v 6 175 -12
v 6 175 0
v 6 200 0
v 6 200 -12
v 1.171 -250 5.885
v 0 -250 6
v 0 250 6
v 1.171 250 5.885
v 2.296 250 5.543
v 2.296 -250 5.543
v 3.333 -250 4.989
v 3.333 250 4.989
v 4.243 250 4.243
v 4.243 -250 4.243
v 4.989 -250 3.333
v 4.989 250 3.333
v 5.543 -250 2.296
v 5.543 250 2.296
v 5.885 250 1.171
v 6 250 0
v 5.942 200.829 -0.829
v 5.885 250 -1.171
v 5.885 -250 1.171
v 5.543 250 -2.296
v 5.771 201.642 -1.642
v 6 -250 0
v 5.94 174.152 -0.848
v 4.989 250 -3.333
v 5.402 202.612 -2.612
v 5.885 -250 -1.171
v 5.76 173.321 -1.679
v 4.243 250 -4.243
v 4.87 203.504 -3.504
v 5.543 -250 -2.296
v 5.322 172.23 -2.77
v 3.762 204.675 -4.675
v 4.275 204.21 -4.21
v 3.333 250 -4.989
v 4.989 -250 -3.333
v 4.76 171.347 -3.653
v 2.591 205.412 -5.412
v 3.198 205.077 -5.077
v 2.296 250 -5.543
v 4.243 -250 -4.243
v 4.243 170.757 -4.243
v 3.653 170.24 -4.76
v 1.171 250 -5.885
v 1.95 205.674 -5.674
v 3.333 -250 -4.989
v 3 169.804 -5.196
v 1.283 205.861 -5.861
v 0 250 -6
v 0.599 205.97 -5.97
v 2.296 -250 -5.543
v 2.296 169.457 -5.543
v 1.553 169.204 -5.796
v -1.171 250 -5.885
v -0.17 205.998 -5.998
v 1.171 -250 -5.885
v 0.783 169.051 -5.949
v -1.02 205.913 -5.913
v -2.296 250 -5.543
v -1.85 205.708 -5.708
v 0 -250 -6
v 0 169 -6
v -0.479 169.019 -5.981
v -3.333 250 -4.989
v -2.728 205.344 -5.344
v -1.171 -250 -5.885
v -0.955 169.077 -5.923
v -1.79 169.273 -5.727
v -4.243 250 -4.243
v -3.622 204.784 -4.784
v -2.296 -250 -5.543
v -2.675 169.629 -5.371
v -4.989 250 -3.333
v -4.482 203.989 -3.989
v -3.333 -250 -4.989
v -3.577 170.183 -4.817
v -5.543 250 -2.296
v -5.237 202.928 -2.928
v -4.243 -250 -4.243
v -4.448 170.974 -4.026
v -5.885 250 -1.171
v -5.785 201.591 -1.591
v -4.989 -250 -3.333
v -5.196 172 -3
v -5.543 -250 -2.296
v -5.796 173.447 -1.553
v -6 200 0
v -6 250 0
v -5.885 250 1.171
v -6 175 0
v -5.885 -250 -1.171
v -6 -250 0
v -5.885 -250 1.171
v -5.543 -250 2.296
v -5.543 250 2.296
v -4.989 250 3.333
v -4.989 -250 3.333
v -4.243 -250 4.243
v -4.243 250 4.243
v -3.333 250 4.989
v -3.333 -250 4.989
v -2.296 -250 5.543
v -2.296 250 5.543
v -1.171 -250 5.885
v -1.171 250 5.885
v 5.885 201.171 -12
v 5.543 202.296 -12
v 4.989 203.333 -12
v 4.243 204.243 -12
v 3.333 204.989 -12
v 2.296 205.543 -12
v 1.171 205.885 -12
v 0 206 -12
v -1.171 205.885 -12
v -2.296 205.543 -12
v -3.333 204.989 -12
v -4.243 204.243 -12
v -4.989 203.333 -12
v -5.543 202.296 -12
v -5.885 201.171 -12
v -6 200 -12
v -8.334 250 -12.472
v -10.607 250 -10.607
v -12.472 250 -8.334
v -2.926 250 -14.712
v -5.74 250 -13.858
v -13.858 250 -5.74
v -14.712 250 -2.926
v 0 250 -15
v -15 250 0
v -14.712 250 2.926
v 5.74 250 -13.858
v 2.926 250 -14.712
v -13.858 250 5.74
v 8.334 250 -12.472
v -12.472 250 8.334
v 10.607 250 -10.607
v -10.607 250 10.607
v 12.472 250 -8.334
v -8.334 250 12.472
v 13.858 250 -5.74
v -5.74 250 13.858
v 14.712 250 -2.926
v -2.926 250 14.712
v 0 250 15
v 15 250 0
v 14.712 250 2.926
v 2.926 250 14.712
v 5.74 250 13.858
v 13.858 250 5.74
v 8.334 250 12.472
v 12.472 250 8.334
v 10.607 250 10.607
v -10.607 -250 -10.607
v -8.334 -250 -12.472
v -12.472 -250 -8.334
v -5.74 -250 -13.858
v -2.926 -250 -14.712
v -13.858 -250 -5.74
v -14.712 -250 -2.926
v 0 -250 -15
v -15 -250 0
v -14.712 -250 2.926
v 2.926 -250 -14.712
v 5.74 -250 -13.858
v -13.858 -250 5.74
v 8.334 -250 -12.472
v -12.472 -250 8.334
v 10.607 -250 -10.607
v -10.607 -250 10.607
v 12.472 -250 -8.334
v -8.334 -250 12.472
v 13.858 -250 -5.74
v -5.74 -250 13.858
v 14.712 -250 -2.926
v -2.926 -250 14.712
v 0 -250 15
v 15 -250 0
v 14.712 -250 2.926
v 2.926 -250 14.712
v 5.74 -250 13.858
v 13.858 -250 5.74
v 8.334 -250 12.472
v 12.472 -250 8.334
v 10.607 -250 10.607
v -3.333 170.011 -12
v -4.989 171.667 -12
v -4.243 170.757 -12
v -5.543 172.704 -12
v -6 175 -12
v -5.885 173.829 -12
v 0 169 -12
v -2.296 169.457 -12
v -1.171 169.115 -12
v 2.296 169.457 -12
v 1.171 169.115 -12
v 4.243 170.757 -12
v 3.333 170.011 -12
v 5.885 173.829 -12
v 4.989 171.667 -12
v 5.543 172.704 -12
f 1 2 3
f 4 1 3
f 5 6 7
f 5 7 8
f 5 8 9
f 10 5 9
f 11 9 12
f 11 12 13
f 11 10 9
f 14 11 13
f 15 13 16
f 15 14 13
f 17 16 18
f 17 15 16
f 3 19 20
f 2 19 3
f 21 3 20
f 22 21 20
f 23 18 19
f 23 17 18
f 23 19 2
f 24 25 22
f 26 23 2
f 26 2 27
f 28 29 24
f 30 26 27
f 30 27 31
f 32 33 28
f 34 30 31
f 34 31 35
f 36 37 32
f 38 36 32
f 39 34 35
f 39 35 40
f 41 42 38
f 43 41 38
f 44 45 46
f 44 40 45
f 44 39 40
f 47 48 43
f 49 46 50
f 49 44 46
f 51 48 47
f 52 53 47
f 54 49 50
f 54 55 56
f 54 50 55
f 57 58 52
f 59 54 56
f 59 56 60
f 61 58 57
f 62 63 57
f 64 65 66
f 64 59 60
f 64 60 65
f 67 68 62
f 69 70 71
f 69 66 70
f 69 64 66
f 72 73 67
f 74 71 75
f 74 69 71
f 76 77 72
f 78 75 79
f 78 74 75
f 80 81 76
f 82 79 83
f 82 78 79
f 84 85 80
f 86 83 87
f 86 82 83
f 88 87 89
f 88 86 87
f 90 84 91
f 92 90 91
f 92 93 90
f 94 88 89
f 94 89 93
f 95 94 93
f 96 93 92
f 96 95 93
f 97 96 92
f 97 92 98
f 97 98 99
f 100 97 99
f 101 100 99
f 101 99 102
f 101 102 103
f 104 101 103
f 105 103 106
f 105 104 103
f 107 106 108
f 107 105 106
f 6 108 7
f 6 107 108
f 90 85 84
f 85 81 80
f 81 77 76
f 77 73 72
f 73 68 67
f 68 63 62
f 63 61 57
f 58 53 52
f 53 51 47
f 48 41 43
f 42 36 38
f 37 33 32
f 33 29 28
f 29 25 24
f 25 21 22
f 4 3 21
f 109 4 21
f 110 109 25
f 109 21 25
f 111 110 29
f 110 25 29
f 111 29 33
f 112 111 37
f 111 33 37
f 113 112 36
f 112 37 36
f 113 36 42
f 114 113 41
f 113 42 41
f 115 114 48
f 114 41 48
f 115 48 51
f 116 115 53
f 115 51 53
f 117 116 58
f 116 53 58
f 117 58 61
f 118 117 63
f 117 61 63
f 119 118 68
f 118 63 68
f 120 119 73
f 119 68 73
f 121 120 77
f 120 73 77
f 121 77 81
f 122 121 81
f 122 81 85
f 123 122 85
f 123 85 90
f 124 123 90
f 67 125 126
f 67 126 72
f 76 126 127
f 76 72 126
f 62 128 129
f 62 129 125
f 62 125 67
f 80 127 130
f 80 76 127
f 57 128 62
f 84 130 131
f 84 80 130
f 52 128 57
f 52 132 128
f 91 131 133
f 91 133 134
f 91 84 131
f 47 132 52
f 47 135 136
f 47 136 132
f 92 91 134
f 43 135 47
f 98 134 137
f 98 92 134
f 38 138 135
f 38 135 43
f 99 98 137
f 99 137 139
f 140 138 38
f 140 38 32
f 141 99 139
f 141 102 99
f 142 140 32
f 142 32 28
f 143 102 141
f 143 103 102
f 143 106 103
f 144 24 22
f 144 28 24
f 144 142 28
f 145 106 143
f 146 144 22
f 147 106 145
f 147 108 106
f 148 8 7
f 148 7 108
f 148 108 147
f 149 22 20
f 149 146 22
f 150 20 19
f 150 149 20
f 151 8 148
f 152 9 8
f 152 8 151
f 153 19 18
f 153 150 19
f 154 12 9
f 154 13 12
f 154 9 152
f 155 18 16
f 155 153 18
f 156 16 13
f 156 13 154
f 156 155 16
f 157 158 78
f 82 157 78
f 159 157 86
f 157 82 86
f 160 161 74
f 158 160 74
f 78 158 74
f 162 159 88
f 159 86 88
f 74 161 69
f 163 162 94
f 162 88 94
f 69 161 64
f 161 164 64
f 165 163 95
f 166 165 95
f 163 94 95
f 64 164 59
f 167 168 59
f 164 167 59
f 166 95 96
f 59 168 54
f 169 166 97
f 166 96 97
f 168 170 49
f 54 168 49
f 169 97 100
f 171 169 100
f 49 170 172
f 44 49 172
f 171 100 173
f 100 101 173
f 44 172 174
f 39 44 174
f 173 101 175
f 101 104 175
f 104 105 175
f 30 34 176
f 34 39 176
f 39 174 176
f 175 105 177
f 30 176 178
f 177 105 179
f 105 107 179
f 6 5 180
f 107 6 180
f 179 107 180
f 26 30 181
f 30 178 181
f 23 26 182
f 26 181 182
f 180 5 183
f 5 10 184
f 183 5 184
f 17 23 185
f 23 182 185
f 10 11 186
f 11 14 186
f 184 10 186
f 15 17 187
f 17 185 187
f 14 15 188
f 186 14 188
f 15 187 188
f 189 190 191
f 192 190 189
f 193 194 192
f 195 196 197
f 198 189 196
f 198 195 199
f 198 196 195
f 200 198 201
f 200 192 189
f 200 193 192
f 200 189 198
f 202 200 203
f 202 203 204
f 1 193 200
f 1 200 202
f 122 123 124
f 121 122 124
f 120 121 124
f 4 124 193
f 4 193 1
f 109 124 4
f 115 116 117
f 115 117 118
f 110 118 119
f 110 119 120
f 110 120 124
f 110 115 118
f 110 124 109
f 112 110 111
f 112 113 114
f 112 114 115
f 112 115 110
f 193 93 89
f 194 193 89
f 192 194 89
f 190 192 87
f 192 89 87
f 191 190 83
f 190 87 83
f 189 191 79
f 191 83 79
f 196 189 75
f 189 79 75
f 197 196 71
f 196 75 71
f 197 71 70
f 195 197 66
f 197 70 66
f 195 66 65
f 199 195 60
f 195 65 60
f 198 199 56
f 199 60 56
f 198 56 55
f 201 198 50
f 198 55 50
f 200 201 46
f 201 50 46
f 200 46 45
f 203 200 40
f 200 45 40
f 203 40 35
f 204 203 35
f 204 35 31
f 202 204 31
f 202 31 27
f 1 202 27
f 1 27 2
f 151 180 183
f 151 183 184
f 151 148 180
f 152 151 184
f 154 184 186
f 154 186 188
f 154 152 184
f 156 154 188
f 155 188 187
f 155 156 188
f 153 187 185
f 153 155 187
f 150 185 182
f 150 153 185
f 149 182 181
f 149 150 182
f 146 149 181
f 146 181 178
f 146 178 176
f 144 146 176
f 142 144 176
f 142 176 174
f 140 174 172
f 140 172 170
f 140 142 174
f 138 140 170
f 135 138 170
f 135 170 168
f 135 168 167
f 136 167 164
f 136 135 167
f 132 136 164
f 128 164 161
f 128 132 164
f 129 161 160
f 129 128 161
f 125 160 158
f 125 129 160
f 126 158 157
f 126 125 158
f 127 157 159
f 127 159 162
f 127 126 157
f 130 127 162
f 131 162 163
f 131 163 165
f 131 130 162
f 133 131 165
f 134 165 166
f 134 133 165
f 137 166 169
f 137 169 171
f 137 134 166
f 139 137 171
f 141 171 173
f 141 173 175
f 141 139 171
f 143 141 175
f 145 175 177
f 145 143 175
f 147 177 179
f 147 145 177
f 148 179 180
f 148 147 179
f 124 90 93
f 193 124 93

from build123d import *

# Parameters (mm, degrees)
SKETCH1_R           = 15
SKETCH1_R_2         = 6
BOSS_EXTRUDE1_DEPTH = 250
CUT_EXTRUDE1_DEPTH  = 12


with BuildPart() as part:
    # Sketch1 → Boss-Extrude1 (new, symmetric)
    with BuildSketch(Plane(origin=(0, 0, 0), x_dir=(1, 0, 0), z_dir=(0, 1, 0))):
        with Locations(Location((0, 0, 0), (0, 0, 270))):
            Circle(SKETCH1_R)
        with Locations(Location((0, 0, 0), (0, 0, 270))):
            Circle(SKETCH1_R_2, mode=Mode.SUBTRACT)
    extrude(amount=BOSS_EXTRUDE1_DEPTH, both=True)

    # Sketch2 → Cut-Extrude1 (cut)
    with BuildSketch(Plane.XY):
        with BuildLine():
            Line((-6, 200), (-6, 174.999998924))
            ThreePointArc((-6, 174.999998924), (0, 168.999998924), (6, 174.999998924))
            Line((6, 174.999998924), (6, 200))
            ThreePointArc((6, 200), (0, 206), (-6, 200))
        make_face()
    extrude(amount=-CUT_EXTRUDE1_DEPTH, mode=Mode.SUBTRACT)


solid = part.part
